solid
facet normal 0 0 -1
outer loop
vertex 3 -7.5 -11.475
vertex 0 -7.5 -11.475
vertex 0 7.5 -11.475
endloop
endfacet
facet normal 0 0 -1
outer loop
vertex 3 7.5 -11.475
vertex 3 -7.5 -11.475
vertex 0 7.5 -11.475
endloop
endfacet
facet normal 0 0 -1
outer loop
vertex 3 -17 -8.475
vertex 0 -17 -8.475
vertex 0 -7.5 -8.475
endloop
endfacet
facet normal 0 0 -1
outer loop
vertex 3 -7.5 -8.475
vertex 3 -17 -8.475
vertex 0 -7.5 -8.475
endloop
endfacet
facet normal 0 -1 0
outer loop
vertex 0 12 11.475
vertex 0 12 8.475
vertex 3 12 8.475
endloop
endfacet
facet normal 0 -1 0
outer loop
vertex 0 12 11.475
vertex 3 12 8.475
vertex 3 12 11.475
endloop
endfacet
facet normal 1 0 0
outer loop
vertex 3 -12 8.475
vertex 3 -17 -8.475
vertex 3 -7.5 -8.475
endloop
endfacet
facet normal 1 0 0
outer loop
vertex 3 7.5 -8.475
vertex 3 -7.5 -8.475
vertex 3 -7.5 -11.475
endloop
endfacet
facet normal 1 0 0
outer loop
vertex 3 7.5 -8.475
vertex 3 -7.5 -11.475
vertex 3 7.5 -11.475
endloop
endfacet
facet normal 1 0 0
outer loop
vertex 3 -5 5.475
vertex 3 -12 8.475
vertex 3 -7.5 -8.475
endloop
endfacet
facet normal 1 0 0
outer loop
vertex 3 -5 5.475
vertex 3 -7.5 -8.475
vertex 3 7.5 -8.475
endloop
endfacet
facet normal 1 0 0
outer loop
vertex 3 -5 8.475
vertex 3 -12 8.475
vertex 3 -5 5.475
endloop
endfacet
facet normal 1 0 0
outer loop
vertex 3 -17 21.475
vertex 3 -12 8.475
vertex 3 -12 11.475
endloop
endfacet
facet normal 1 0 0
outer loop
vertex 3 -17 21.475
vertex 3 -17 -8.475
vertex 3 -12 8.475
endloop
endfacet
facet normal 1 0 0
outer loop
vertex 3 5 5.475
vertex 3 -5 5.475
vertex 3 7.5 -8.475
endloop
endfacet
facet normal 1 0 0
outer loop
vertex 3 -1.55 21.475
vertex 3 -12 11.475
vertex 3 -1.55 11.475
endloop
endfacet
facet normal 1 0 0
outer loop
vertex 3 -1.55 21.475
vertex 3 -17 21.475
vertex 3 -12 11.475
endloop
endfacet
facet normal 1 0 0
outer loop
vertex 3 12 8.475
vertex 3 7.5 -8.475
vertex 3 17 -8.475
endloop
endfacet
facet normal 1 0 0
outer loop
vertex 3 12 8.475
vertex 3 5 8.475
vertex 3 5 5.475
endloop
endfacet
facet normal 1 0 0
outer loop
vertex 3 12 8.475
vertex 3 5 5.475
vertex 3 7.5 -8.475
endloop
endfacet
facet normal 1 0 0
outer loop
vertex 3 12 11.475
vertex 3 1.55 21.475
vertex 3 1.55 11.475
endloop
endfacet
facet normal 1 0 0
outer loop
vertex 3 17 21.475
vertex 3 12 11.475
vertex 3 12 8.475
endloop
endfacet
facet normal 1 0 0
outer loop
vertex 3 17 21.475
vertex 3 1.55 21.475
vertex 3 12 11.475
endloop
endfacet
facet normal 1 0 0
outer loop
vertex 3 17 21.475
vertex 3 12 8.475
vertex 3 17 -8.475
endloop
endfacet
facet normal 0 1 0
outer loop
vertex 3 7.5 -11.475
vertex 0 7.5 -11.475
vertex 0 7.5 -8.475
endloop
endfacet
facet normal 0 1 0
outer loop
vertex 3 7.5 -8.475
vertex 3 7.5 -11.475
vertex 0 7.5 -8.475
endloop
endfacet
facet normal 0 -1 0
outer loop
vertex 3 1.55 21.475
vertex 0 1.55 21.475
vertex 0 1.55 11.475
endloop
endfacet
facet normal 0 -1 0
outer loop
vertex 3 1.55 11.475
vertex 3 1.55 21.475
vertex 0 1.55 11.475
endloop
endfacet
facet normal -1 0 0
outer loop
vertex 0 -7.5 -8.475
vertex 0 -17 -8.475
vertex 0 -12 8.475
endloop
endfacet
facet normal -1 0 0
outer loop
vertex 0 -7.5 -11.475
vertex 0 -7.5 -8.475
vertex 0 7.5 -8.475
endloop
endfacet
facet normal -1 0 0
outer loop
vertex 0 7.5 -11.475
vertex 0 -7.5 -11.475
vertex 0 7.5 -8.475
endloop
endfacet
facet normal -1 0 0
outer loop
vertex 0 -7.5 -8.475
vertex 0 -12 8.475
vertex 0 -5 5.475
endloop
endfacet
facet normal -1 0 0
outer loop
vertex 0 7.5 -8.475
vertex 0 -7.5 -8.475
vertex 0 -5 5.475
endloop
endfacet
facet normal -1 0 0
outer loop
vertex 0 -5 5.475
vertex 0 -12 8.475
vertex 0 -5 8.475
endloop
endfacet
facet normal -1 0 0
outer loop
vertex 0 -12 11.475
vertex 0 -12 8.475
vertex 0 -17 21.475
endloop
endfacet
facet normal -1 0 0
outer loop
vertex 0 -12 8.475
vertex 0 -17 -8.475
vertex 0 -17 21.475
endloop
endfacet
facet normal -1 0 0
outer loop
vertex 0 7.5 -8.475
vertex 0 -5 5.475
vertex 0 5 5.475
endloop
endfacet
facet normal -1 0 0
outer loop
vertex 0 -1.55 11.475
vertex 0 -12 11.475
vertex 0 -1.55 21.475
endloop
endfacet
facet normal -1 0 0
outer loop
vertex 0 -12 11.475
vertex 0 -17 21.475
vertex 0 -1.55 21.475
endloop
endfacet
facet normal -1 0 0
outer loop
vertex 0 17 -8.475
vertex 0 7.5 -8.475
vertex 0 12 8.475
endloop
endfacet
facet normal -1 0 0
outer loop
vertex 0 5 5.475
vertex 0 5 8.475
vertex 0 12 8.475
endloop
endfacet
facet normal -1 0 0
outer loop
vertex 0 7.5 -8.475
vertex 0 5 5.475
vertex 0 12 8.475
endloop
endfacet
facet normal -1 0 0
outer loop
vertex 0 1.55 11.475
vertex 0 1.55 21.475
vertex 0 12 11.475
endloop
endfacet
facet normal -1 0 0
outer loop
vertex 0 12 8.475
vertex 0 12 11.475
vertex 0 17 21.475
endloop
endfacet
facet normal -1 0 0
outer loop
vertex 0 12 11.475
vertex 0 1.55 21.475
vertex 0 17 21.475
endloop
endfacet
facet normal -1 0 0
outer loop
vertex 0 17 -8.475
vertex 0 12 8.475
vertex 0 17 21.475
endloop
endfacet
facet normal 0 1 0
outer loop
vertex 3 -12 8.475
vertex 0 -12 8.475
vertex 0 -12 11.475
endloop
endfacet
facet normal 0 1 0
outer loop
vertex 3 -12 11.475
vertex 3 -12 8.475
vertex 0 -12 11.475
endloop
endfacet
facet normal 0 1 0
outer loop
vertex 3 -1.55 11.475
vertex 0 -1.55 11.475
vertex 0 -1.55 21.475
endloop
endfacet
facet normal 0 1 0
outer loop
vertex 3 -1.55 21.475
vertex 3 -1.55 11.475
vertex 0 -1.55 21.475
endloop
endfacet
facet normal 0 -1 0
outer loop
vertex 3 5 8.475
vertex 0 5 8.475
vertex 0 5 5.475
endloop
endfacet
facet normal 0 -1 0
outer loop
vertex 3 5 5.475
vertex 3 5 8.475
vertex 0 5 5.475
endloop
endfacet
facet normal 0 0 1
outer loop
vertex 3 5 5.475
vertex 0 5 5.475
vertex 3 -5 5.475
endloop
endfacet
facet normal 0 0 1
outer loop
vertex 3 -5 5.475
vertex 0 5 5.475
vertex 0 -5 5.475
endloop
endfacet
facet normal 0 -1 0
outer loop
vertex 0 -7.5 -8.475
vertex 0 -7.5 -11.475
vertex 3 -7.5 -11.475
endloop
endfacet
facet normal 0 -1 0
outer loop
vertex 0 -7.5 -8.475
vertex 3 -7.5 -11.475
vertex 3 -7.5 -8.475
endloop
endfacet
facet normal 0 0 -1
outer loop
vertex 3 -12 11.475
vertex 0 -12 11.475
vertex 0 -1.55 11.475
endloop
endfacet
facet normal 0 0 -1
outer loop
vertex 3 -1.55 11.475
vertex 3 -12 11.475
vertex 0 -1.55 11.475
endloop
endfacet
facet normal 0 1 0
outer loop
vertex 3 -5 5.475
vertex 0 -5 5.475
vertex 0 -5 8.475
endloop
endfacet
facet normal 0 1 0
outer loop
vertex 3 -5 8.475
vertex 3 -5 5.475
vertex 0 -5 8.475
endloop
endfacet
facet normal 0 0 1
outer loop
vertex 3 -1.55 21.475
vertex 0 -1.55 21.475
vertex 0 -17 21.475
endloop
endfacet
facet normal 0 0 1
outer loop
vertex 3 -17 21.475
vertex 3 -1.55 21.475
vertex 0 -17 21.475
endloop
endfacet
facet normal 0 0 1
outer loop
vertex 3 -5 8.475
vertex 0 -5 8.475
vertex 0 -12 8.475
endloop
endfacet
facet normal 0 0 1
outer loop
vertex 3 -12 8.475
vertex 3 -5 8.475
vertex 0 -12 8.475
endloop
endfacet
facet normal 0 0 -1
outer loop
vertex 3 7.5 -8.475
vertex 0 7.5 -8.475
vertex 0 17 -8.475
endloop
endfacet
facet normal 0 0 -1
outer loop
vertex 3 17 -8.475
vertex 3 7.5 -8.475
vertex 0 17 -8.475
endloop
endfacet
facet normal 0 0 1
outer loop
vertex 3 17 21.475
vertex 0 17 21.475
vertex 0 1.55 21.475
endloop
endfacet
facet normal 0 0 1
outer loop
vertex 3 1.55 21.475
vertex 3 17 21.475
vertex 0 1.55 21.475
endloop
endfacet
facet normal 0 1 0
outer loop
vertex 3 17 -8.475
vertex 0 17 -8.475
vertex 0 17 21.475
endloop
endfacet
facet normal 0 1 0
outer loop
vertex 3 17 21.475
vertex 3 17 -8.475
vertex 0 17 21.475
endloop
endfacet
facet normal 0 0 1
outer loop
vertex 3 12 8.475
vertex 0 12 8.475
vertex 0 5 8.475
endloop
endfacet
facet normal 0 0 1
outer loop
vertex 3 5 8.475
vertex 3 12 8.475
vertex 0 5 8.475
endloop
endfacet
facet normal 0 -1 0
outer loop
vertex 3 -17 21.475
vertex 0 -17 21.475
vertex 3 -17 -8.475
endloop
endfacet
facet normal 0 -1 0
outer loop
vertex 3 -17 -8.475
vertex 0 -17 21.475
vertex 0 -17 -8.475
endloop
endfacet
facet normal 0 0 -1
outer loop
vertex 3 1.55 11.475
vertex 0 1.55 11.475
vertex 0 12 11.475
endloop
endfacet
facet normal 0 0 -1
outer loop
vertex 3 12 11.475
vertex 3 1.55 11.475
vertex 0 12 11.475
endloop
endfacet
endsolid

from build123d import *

# Parameters (mm, degrees)
F0_W     = 5
F0_H     = 3
F0_W_2   = 15
F1_DEPTH = 3


with BuildPart() as f1:
    # F0 (on Right) → F1 (new body)
    with BuildSketch(Plane.YZ):
        with Locations((-14.5, 9.975)):
            Rectangle(F0_W, F0_H)
        with Locations((14.5, 9.975)):
            Rectangle(F0_W, F0_H)
        with Locations((0, -9.975)):
            Rectangle(F0_W_2, F0_H)
        Polygon((7.5, -8.475), (17, -8.475), (17, 8.475), (12, 8.475), (5, 8.475), (5, 5.475), (-5, 5.475), (-5, 8.475), (-12, 8.475), (-17, 8.475), (-17, -8.475), (-7.5, -8.475), align=None)
        Polygon((-17, 21.475), (-17, 11.475), (-12, 11.475), (-1.55, 11.475), (-1.55, 21.475), align=None)
        Polygon((12, 11.475), (17, 11.475), (17, 21.475), (1.55, 21.475), (1.55, 11.475), align=None)
    extrude(amount=F1_DEPTH)


solid = f1.part
